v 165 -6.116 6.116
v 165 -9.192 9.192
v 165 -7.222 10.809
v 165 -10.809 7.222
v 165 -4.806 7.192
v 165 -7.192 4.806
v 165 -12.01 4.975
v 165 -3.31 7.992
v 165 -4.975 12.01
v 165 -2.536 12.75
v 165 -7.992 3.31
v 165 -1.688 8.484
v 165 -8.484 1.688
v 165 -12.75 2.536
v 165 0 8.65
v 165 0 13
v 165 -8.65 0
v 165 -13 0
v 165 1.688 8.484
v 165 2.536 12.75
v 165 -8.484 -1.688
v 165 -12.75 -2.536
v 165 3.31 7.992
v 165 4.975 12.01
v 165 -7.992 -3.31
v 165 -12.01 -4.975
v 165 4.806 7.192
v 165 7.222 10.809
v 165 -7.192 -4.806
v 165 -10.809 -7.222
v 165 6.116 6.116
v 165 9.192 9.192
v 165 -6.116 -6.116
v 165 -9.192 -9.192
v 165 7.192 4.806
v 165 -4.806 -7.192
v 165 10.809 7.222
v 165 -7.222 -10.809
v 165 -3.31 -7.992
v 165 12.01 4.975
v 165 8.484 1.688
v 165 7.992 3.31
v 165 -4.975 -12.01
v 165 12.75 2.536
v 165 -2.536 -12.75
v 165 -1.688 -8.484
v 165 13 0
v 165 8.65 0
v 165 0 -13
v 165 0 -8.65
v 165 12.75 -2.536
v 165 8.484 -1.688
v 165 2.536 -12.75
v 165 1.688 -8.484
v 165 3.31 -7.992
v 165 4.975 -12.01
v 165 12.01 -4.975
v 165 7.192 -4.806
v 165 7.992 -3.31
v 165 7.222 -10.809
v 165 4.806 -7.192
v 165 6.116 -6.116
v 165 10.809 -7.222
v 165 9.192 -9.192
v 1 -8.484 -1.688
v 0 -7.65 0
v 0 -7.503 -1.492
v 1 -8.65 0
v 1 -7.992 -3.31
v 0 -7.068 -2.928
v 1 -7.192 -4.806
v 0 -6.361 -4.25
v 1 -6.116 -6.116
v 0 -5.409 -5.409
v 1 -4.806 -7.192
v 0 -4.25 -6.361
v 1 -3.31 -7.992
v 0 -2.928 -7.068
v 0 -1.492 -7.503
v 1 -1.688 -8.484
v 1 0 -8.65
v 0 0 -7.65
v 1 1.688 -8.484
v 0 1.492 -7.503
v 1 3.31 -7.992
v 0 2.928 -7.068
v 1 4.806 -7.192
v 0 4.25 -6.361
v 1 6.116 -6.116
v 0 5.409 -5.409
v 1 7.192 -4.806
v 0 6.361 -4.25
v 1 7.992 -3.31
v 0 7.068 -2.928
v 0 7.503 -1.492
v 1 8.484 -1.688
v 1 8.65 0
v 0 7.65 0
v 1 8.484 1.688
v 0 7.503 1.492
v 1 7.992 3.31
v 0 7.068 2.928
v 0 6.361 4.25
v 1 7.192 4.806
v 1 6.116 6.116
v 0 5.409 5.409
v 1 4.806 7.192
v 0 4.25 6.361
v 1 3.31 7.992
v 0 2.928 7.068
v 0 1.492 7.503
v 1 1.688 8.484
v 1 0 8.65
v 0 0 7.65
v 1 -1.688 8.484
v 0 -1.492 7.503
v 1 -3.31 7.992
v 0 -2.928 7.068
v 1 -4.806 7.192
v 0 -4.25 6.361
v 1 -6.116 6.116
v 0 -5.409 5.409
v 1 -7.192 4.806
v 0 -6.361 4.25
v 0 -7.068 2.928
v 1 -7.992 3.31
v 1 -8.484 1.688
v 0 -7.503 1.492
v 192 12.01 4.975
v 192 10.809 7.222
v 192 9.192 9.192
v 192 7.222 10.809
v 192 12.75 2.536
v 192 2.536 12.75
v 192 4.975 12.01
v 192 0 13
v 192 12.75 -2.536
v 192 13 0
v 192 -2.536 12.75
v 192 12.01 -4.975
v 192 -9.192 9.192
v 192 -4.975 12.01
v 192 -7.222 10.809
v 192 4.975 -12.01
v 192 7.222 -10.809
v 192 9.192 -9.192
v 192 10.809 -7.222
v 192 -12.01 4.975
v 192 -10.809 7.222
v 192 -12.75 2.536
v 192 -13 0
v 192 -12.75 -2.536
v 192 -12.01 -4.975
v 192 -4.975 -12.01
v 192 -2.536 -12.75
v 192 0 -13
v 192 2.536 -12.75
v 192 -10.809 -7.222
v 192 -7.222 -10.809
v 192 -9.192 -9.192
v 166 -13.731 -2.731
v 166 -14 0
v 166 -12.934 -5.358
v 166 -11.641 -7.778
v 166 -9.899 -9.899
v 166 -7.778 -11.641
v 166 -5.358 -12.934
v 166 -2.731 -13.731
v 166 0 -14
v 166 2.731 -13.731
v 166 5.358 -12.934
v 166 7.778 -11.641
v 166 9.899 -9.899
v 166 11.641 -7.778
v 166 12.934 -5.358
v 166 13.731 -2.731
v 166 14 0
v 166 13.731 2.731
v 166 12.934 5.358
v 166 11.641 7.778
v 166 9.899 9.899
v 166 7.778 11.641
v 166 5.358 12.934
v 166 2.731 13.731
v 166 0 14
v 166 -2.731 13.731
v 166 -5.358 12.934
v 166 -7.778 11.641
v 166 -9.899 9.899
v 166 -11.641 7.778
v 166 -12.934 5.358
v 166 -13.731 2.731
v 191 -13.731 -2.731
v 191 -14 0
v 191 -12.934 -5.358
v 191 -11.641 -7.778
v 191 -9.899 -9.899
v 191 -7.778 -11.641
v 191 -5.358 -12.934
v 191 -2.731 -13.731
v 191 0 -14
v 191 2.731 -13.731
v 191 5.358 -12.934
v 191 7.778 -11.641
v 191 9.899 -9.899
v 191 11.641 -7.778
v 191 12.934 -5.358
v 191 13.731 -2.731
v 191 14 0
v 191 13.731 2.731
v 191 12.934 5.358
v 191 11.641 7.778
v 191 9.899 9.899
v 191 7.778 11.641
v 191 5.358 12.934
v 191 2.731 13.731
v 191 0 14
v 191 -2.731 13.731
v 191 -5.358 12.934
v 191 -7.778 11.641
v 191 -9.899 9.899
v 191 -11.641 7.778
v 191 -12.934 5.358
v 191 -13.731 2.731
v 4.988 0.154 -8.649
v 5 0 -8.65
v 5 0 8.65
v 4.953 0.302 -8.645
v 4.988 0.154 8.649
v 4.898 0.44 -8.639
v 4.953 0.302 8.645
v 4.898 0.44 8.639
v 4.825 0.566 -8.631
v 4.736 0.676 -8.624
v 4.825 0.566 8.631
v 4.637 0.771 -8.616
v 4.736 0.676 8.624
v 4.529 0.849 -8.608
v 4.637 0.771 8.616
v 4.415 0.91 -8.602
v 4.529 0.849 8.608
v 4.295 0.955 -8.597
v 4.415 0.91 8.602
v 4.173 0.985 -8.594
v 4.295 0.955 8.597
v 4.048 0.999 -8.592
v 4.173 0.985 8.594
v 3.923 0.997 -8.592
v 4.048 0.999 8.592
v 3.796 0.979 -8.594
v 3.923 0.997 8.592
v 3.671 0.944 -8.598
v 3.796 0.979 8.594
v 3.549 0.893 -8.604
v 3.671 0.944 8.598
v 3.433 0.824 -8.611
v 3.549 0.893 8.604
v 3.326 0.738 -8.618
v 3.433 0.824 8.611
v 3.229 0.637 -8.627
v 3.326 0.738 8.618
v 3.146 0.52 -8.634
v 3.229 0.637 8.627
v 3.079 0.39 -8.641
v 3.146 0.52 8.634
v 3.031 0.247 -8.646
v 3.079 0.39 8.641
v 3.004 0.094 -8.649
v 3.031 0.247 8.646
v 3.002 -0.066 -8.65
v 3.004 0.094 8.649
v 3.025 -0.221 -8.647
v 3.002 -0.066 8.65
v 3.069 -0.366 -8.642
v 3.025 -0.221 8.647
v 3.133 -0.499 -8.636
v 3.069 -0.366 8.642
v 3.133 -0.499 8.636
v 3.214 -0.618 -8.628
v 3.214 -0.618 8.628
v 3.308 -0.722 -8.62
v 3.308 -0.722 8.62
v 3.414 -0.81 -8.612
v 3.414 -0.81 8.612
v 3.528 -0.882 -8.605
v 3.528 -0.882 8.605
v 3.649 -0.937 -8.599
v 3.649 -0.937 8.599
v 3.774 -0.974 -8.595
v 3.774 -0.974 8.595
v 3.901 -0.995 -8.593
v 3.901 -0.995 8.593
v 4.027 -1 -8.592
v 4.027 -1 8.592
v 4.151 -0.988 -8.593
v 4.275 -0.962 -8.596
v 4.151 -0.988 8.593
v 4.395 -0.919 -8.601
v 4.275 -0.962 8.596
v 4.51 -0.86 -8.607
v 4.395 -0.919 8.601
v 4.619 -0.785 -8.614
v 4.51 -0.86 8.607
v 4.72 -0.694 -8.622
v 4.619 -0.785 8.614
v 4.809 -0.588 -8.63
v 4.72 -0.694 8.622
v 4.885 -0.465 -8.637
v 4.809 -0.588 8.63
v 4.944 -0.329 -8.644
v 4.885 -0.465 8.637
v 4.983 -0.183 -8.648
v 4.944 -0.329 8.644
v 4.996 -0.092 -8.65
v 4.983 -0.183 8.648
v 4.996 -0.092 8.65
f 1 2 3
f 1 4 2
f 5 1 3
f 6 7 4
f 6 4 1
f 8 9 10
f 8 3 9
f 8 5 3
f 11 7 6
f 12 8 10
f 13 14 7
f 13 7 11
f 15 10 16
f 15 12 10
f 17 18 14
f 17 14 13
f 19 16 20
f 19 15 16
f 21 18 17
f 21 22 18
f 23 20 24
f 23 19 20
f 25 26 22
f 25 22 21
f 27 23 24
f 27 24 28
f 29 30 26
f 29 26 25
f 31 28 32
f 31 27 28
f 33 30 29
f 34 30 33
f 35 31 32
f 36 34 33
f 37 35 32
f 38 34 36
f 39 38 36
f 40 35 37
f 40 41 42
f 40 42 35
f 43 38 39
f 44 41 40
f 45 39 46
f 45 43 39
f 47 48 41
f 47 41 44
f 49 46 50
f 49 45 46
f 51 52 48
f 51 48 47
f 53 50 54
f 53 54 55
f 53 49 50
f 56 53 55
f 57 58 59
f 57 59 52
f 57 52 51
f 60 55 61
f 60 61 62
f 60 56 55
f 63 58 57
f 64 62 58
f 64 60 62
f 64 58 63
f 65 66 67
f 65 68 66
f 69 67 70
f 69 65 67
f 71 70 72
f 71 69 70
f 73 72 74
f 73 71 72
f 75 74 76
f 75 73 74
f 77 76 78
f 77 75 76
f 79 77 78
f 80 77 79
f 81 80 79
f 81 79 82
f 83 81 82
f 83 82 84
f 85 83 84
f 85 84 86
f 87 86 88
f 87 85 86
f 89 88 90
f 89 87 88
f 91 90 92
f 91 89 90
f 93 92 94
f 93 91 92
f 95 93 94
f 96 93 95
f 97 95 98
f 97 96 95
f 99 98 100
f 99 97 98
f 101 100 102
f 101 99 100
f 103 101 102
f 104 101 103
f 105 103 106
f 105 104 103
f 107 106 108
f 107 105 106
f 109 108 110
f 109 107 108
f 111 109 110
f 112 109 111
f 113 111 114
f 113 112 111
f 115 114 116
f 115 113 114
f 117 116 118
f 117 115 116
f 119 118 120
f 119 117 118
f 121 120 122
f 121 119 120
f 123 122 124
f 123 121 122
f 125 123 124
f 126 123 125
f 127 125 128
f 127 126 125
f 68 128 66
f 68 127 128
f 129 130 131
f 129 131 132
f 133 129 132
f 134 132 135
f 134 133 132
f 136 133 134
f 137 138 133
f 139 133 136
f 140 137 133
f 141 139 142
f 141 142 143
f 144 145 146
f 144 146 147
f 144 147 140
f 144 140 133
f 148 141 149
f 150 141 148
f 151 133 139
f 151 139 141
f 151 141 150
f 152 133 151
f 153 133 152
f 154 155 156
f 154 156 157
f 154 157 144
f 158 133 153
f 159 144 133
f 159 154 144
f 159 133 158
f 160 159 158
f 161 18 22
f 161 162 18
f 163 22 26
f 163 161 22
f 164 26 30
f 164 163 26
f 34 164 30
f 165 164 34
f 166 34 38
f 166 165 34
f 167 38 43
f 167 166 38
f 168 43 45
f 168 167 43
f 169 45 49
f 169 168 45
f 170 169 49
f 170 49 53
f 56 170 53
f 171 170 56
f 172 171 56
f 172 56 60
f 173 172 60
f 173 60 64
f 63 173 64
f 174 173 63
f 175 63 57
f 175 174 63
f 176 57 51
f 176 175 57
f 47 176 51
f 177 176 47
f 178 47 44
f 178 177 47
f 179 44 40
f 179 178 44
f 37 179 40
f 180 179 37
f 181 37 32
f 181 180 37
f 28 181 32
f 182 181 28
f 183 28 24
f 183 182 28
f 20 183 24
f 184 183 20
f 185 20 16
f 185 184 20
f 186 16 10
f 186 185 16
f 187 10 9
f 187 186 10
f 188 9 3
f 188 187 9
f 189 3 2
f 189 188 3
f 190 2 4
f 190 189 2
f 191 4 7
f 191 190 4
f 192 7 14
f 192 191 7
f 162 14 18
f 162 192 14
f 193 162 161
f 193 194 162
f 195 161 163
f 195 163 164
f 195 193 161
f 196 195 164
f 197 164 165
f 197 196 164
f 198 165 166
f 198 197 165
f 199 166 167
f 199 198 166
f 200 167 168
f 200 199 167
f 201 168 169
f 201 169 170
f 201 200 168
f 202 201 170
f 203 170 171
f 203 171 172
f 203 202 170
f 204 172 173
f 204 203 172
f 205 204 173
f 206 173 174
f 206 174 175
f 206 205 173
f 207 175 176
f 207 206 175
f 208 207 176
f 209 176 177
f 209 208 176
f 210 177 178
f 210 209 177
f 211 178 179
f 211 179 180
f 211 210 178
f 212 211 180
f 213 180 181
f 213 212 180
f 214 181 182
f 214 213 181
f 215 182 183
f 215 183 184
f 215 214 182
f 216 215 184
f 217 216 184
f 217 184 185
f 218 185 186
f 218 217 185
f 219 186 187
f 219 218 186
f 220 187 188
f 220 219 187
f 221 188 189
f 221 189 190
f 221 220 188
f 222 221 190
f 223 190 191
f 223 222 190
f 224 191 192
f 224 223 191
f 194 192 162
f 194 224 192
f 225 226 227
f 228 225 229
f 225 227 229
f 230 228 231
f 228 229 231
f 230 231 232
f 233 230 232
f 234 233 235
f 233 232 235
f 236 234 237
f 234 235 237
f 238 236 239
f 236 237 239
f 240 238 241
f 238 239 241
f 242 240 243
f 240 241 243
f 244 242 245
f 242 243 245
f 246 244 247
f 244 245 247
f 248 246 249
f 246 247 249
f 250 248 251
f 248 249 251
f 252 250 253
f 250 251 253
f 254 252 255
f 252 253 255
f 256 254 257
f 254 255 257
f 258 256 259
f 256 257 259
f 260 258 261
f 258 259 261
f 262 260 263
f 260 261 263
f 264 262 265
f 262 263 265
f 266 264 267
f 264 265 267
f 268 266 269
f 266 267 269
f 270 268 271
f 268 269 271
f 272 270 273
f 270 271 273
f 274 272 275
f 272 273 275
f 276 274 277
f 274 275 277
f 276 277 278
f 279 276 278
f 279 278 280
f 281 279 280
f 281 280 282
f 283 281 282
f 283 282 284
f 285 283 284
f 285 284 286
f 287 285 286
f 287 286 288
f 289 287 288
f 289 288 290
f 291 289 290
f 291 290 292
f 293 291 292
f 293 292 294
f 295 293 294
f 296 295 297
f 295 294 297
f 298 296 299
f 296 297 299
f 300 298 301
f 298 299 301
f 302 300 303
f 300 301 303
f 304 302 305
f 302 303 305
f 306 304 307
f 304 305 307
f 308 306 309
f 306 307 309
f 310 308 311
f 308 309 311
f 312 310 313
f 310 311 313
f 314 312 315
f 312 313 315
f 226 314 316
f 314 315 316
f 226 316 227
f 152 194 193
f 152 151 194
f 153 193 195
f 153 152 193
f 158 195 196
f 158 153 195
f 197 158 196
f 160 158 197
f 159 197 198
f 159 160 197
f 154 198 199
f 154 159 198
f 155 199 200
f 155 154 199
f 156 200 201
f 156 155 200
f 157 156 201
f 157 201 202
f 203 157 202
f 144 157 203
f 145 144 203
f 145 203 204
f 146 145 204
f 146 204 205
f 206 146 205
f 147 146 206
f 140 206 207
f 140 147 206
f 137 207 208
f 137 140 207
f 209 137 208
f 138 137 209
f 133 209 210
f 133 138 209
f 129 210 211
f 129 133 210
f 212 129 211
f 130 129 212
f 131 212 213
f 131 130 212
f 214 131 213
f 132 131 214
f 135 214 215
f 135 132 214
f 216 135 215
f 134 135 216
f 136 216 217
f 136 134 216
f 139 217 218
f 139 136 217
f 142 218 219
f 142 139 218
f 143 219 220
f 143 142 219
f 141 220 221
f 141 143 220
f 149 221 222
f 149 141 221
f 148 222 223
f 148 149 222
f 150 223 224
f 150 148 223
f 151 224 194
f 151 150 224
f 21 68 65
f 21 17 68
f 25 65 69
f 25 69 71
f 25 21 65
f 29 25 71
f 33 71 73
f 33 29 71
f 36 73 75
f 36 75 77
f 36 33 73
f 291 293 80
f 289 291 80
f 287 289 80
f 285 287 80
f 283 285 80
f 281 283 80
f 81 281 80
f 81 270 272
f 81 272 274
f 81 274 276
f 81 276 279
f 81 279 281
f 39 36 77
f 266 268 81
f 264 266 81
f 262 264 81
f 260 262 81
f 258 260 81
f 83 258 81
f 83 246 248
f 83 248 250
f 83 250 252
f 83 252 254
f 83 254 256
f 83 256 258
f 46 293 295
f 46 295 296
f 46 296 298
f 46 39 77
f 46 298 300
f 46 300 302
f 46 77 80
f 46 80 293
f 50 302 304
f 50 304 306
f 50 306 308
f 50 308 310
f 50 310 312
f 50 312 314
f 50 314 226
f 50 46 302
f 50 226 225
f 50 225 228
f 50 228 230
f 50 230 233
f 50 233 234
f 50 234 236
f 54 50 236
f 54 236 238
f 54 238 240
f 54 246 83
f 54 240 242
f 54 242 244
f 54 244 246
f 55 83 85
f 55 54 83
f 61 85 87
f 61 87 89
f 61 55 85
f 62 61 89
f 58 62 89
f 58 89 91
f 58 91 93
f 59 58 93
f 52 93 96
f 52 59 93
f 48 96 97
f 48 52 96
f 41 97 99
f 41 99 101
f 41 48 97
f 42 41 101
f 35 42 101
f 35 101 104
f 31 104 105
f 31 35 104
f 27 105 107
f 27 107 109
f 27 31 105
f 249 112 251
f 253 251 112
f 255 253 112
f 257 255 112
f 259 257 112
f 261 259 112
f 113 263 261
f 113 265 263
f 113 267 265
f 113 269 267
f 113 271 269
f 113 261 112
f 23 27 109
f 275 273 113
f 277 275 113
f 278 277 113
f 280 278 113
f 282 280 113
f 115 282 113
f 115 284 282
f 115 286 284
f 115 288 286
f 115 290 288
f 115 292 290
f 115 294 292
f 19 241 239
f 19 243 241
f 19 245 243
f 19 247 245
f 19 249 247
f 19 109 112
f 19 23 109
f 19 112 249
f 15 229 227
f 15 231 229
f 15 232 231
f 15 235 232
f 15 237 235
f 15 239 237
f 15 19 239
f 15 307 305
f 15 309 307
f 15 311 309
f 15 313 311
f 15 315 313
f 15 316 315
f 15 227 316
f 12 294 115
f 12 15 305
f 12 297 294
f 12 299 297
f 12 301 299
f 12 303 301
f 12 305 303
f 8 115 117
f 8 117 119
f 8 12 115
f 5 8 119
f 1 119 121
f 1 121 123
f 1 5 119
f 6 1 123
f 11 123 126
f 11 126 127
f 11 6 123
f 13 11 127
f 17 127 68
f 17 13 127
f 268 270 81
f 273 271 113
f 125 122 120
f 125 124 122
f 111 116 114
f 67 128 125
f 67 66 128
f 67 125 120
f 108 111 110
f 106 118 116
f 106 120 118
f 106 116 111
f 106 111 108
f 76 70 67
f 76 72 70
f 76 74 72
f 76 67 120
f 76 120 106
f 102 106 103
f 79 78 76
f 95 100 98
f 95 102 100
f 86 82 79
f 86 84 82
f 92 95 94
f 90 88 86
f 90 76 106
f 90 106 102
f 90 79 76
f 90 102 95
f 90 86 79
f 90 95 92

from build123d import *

# Parameters (mm, degrees)
ESQUISSE2_R                  = 1
ENL_V_MAT_EXTRU_1_DEPTH      = 15
ENL_V_MAT_EXTRU_1_DEPTH_BACK = 15


with BuildPart() as part:
    # Esquisse1 → Révolution1 (revolve)
    with BuildSketch(Plane.XY, mode=Mode.PRIVATE) as r_volution1_sk:
        Polygon((0, 0), (0, 7.65), (1, 8.65), (165, 8.65), (165, 13), (166, 14), (191, 14), (192, 13), (192, 0), align=None)
    revolve(r_volution1_sk.sketch.rotate(Axis((0, 0, 0), (1, 0, 0)), 180), axis=Axis((0, 0, 0), (1, 0, 0)))  # turned: the seam where the file's is

    # Esquisse2 → Enlèv. mat.-Extru.1 (cut, two sides)
    with BuildSketch(Plane.XY) as enl_v_mat_extru_1_sk:
        with Locations((4, 0)):
            Circle(ESQUISSE2_R)
    extrude(amount=ENL_V_MAT_EXTRU_1_DEPTH, mode=Mode.SUBTRACT)
    extrude(enl_v_mat_extru_1_sk.sketch, amount=-ENL_V_MAT_EXTRU_1_DEPTH_BACK, mode=Mode.SUBTRACT)


solid = part.part
